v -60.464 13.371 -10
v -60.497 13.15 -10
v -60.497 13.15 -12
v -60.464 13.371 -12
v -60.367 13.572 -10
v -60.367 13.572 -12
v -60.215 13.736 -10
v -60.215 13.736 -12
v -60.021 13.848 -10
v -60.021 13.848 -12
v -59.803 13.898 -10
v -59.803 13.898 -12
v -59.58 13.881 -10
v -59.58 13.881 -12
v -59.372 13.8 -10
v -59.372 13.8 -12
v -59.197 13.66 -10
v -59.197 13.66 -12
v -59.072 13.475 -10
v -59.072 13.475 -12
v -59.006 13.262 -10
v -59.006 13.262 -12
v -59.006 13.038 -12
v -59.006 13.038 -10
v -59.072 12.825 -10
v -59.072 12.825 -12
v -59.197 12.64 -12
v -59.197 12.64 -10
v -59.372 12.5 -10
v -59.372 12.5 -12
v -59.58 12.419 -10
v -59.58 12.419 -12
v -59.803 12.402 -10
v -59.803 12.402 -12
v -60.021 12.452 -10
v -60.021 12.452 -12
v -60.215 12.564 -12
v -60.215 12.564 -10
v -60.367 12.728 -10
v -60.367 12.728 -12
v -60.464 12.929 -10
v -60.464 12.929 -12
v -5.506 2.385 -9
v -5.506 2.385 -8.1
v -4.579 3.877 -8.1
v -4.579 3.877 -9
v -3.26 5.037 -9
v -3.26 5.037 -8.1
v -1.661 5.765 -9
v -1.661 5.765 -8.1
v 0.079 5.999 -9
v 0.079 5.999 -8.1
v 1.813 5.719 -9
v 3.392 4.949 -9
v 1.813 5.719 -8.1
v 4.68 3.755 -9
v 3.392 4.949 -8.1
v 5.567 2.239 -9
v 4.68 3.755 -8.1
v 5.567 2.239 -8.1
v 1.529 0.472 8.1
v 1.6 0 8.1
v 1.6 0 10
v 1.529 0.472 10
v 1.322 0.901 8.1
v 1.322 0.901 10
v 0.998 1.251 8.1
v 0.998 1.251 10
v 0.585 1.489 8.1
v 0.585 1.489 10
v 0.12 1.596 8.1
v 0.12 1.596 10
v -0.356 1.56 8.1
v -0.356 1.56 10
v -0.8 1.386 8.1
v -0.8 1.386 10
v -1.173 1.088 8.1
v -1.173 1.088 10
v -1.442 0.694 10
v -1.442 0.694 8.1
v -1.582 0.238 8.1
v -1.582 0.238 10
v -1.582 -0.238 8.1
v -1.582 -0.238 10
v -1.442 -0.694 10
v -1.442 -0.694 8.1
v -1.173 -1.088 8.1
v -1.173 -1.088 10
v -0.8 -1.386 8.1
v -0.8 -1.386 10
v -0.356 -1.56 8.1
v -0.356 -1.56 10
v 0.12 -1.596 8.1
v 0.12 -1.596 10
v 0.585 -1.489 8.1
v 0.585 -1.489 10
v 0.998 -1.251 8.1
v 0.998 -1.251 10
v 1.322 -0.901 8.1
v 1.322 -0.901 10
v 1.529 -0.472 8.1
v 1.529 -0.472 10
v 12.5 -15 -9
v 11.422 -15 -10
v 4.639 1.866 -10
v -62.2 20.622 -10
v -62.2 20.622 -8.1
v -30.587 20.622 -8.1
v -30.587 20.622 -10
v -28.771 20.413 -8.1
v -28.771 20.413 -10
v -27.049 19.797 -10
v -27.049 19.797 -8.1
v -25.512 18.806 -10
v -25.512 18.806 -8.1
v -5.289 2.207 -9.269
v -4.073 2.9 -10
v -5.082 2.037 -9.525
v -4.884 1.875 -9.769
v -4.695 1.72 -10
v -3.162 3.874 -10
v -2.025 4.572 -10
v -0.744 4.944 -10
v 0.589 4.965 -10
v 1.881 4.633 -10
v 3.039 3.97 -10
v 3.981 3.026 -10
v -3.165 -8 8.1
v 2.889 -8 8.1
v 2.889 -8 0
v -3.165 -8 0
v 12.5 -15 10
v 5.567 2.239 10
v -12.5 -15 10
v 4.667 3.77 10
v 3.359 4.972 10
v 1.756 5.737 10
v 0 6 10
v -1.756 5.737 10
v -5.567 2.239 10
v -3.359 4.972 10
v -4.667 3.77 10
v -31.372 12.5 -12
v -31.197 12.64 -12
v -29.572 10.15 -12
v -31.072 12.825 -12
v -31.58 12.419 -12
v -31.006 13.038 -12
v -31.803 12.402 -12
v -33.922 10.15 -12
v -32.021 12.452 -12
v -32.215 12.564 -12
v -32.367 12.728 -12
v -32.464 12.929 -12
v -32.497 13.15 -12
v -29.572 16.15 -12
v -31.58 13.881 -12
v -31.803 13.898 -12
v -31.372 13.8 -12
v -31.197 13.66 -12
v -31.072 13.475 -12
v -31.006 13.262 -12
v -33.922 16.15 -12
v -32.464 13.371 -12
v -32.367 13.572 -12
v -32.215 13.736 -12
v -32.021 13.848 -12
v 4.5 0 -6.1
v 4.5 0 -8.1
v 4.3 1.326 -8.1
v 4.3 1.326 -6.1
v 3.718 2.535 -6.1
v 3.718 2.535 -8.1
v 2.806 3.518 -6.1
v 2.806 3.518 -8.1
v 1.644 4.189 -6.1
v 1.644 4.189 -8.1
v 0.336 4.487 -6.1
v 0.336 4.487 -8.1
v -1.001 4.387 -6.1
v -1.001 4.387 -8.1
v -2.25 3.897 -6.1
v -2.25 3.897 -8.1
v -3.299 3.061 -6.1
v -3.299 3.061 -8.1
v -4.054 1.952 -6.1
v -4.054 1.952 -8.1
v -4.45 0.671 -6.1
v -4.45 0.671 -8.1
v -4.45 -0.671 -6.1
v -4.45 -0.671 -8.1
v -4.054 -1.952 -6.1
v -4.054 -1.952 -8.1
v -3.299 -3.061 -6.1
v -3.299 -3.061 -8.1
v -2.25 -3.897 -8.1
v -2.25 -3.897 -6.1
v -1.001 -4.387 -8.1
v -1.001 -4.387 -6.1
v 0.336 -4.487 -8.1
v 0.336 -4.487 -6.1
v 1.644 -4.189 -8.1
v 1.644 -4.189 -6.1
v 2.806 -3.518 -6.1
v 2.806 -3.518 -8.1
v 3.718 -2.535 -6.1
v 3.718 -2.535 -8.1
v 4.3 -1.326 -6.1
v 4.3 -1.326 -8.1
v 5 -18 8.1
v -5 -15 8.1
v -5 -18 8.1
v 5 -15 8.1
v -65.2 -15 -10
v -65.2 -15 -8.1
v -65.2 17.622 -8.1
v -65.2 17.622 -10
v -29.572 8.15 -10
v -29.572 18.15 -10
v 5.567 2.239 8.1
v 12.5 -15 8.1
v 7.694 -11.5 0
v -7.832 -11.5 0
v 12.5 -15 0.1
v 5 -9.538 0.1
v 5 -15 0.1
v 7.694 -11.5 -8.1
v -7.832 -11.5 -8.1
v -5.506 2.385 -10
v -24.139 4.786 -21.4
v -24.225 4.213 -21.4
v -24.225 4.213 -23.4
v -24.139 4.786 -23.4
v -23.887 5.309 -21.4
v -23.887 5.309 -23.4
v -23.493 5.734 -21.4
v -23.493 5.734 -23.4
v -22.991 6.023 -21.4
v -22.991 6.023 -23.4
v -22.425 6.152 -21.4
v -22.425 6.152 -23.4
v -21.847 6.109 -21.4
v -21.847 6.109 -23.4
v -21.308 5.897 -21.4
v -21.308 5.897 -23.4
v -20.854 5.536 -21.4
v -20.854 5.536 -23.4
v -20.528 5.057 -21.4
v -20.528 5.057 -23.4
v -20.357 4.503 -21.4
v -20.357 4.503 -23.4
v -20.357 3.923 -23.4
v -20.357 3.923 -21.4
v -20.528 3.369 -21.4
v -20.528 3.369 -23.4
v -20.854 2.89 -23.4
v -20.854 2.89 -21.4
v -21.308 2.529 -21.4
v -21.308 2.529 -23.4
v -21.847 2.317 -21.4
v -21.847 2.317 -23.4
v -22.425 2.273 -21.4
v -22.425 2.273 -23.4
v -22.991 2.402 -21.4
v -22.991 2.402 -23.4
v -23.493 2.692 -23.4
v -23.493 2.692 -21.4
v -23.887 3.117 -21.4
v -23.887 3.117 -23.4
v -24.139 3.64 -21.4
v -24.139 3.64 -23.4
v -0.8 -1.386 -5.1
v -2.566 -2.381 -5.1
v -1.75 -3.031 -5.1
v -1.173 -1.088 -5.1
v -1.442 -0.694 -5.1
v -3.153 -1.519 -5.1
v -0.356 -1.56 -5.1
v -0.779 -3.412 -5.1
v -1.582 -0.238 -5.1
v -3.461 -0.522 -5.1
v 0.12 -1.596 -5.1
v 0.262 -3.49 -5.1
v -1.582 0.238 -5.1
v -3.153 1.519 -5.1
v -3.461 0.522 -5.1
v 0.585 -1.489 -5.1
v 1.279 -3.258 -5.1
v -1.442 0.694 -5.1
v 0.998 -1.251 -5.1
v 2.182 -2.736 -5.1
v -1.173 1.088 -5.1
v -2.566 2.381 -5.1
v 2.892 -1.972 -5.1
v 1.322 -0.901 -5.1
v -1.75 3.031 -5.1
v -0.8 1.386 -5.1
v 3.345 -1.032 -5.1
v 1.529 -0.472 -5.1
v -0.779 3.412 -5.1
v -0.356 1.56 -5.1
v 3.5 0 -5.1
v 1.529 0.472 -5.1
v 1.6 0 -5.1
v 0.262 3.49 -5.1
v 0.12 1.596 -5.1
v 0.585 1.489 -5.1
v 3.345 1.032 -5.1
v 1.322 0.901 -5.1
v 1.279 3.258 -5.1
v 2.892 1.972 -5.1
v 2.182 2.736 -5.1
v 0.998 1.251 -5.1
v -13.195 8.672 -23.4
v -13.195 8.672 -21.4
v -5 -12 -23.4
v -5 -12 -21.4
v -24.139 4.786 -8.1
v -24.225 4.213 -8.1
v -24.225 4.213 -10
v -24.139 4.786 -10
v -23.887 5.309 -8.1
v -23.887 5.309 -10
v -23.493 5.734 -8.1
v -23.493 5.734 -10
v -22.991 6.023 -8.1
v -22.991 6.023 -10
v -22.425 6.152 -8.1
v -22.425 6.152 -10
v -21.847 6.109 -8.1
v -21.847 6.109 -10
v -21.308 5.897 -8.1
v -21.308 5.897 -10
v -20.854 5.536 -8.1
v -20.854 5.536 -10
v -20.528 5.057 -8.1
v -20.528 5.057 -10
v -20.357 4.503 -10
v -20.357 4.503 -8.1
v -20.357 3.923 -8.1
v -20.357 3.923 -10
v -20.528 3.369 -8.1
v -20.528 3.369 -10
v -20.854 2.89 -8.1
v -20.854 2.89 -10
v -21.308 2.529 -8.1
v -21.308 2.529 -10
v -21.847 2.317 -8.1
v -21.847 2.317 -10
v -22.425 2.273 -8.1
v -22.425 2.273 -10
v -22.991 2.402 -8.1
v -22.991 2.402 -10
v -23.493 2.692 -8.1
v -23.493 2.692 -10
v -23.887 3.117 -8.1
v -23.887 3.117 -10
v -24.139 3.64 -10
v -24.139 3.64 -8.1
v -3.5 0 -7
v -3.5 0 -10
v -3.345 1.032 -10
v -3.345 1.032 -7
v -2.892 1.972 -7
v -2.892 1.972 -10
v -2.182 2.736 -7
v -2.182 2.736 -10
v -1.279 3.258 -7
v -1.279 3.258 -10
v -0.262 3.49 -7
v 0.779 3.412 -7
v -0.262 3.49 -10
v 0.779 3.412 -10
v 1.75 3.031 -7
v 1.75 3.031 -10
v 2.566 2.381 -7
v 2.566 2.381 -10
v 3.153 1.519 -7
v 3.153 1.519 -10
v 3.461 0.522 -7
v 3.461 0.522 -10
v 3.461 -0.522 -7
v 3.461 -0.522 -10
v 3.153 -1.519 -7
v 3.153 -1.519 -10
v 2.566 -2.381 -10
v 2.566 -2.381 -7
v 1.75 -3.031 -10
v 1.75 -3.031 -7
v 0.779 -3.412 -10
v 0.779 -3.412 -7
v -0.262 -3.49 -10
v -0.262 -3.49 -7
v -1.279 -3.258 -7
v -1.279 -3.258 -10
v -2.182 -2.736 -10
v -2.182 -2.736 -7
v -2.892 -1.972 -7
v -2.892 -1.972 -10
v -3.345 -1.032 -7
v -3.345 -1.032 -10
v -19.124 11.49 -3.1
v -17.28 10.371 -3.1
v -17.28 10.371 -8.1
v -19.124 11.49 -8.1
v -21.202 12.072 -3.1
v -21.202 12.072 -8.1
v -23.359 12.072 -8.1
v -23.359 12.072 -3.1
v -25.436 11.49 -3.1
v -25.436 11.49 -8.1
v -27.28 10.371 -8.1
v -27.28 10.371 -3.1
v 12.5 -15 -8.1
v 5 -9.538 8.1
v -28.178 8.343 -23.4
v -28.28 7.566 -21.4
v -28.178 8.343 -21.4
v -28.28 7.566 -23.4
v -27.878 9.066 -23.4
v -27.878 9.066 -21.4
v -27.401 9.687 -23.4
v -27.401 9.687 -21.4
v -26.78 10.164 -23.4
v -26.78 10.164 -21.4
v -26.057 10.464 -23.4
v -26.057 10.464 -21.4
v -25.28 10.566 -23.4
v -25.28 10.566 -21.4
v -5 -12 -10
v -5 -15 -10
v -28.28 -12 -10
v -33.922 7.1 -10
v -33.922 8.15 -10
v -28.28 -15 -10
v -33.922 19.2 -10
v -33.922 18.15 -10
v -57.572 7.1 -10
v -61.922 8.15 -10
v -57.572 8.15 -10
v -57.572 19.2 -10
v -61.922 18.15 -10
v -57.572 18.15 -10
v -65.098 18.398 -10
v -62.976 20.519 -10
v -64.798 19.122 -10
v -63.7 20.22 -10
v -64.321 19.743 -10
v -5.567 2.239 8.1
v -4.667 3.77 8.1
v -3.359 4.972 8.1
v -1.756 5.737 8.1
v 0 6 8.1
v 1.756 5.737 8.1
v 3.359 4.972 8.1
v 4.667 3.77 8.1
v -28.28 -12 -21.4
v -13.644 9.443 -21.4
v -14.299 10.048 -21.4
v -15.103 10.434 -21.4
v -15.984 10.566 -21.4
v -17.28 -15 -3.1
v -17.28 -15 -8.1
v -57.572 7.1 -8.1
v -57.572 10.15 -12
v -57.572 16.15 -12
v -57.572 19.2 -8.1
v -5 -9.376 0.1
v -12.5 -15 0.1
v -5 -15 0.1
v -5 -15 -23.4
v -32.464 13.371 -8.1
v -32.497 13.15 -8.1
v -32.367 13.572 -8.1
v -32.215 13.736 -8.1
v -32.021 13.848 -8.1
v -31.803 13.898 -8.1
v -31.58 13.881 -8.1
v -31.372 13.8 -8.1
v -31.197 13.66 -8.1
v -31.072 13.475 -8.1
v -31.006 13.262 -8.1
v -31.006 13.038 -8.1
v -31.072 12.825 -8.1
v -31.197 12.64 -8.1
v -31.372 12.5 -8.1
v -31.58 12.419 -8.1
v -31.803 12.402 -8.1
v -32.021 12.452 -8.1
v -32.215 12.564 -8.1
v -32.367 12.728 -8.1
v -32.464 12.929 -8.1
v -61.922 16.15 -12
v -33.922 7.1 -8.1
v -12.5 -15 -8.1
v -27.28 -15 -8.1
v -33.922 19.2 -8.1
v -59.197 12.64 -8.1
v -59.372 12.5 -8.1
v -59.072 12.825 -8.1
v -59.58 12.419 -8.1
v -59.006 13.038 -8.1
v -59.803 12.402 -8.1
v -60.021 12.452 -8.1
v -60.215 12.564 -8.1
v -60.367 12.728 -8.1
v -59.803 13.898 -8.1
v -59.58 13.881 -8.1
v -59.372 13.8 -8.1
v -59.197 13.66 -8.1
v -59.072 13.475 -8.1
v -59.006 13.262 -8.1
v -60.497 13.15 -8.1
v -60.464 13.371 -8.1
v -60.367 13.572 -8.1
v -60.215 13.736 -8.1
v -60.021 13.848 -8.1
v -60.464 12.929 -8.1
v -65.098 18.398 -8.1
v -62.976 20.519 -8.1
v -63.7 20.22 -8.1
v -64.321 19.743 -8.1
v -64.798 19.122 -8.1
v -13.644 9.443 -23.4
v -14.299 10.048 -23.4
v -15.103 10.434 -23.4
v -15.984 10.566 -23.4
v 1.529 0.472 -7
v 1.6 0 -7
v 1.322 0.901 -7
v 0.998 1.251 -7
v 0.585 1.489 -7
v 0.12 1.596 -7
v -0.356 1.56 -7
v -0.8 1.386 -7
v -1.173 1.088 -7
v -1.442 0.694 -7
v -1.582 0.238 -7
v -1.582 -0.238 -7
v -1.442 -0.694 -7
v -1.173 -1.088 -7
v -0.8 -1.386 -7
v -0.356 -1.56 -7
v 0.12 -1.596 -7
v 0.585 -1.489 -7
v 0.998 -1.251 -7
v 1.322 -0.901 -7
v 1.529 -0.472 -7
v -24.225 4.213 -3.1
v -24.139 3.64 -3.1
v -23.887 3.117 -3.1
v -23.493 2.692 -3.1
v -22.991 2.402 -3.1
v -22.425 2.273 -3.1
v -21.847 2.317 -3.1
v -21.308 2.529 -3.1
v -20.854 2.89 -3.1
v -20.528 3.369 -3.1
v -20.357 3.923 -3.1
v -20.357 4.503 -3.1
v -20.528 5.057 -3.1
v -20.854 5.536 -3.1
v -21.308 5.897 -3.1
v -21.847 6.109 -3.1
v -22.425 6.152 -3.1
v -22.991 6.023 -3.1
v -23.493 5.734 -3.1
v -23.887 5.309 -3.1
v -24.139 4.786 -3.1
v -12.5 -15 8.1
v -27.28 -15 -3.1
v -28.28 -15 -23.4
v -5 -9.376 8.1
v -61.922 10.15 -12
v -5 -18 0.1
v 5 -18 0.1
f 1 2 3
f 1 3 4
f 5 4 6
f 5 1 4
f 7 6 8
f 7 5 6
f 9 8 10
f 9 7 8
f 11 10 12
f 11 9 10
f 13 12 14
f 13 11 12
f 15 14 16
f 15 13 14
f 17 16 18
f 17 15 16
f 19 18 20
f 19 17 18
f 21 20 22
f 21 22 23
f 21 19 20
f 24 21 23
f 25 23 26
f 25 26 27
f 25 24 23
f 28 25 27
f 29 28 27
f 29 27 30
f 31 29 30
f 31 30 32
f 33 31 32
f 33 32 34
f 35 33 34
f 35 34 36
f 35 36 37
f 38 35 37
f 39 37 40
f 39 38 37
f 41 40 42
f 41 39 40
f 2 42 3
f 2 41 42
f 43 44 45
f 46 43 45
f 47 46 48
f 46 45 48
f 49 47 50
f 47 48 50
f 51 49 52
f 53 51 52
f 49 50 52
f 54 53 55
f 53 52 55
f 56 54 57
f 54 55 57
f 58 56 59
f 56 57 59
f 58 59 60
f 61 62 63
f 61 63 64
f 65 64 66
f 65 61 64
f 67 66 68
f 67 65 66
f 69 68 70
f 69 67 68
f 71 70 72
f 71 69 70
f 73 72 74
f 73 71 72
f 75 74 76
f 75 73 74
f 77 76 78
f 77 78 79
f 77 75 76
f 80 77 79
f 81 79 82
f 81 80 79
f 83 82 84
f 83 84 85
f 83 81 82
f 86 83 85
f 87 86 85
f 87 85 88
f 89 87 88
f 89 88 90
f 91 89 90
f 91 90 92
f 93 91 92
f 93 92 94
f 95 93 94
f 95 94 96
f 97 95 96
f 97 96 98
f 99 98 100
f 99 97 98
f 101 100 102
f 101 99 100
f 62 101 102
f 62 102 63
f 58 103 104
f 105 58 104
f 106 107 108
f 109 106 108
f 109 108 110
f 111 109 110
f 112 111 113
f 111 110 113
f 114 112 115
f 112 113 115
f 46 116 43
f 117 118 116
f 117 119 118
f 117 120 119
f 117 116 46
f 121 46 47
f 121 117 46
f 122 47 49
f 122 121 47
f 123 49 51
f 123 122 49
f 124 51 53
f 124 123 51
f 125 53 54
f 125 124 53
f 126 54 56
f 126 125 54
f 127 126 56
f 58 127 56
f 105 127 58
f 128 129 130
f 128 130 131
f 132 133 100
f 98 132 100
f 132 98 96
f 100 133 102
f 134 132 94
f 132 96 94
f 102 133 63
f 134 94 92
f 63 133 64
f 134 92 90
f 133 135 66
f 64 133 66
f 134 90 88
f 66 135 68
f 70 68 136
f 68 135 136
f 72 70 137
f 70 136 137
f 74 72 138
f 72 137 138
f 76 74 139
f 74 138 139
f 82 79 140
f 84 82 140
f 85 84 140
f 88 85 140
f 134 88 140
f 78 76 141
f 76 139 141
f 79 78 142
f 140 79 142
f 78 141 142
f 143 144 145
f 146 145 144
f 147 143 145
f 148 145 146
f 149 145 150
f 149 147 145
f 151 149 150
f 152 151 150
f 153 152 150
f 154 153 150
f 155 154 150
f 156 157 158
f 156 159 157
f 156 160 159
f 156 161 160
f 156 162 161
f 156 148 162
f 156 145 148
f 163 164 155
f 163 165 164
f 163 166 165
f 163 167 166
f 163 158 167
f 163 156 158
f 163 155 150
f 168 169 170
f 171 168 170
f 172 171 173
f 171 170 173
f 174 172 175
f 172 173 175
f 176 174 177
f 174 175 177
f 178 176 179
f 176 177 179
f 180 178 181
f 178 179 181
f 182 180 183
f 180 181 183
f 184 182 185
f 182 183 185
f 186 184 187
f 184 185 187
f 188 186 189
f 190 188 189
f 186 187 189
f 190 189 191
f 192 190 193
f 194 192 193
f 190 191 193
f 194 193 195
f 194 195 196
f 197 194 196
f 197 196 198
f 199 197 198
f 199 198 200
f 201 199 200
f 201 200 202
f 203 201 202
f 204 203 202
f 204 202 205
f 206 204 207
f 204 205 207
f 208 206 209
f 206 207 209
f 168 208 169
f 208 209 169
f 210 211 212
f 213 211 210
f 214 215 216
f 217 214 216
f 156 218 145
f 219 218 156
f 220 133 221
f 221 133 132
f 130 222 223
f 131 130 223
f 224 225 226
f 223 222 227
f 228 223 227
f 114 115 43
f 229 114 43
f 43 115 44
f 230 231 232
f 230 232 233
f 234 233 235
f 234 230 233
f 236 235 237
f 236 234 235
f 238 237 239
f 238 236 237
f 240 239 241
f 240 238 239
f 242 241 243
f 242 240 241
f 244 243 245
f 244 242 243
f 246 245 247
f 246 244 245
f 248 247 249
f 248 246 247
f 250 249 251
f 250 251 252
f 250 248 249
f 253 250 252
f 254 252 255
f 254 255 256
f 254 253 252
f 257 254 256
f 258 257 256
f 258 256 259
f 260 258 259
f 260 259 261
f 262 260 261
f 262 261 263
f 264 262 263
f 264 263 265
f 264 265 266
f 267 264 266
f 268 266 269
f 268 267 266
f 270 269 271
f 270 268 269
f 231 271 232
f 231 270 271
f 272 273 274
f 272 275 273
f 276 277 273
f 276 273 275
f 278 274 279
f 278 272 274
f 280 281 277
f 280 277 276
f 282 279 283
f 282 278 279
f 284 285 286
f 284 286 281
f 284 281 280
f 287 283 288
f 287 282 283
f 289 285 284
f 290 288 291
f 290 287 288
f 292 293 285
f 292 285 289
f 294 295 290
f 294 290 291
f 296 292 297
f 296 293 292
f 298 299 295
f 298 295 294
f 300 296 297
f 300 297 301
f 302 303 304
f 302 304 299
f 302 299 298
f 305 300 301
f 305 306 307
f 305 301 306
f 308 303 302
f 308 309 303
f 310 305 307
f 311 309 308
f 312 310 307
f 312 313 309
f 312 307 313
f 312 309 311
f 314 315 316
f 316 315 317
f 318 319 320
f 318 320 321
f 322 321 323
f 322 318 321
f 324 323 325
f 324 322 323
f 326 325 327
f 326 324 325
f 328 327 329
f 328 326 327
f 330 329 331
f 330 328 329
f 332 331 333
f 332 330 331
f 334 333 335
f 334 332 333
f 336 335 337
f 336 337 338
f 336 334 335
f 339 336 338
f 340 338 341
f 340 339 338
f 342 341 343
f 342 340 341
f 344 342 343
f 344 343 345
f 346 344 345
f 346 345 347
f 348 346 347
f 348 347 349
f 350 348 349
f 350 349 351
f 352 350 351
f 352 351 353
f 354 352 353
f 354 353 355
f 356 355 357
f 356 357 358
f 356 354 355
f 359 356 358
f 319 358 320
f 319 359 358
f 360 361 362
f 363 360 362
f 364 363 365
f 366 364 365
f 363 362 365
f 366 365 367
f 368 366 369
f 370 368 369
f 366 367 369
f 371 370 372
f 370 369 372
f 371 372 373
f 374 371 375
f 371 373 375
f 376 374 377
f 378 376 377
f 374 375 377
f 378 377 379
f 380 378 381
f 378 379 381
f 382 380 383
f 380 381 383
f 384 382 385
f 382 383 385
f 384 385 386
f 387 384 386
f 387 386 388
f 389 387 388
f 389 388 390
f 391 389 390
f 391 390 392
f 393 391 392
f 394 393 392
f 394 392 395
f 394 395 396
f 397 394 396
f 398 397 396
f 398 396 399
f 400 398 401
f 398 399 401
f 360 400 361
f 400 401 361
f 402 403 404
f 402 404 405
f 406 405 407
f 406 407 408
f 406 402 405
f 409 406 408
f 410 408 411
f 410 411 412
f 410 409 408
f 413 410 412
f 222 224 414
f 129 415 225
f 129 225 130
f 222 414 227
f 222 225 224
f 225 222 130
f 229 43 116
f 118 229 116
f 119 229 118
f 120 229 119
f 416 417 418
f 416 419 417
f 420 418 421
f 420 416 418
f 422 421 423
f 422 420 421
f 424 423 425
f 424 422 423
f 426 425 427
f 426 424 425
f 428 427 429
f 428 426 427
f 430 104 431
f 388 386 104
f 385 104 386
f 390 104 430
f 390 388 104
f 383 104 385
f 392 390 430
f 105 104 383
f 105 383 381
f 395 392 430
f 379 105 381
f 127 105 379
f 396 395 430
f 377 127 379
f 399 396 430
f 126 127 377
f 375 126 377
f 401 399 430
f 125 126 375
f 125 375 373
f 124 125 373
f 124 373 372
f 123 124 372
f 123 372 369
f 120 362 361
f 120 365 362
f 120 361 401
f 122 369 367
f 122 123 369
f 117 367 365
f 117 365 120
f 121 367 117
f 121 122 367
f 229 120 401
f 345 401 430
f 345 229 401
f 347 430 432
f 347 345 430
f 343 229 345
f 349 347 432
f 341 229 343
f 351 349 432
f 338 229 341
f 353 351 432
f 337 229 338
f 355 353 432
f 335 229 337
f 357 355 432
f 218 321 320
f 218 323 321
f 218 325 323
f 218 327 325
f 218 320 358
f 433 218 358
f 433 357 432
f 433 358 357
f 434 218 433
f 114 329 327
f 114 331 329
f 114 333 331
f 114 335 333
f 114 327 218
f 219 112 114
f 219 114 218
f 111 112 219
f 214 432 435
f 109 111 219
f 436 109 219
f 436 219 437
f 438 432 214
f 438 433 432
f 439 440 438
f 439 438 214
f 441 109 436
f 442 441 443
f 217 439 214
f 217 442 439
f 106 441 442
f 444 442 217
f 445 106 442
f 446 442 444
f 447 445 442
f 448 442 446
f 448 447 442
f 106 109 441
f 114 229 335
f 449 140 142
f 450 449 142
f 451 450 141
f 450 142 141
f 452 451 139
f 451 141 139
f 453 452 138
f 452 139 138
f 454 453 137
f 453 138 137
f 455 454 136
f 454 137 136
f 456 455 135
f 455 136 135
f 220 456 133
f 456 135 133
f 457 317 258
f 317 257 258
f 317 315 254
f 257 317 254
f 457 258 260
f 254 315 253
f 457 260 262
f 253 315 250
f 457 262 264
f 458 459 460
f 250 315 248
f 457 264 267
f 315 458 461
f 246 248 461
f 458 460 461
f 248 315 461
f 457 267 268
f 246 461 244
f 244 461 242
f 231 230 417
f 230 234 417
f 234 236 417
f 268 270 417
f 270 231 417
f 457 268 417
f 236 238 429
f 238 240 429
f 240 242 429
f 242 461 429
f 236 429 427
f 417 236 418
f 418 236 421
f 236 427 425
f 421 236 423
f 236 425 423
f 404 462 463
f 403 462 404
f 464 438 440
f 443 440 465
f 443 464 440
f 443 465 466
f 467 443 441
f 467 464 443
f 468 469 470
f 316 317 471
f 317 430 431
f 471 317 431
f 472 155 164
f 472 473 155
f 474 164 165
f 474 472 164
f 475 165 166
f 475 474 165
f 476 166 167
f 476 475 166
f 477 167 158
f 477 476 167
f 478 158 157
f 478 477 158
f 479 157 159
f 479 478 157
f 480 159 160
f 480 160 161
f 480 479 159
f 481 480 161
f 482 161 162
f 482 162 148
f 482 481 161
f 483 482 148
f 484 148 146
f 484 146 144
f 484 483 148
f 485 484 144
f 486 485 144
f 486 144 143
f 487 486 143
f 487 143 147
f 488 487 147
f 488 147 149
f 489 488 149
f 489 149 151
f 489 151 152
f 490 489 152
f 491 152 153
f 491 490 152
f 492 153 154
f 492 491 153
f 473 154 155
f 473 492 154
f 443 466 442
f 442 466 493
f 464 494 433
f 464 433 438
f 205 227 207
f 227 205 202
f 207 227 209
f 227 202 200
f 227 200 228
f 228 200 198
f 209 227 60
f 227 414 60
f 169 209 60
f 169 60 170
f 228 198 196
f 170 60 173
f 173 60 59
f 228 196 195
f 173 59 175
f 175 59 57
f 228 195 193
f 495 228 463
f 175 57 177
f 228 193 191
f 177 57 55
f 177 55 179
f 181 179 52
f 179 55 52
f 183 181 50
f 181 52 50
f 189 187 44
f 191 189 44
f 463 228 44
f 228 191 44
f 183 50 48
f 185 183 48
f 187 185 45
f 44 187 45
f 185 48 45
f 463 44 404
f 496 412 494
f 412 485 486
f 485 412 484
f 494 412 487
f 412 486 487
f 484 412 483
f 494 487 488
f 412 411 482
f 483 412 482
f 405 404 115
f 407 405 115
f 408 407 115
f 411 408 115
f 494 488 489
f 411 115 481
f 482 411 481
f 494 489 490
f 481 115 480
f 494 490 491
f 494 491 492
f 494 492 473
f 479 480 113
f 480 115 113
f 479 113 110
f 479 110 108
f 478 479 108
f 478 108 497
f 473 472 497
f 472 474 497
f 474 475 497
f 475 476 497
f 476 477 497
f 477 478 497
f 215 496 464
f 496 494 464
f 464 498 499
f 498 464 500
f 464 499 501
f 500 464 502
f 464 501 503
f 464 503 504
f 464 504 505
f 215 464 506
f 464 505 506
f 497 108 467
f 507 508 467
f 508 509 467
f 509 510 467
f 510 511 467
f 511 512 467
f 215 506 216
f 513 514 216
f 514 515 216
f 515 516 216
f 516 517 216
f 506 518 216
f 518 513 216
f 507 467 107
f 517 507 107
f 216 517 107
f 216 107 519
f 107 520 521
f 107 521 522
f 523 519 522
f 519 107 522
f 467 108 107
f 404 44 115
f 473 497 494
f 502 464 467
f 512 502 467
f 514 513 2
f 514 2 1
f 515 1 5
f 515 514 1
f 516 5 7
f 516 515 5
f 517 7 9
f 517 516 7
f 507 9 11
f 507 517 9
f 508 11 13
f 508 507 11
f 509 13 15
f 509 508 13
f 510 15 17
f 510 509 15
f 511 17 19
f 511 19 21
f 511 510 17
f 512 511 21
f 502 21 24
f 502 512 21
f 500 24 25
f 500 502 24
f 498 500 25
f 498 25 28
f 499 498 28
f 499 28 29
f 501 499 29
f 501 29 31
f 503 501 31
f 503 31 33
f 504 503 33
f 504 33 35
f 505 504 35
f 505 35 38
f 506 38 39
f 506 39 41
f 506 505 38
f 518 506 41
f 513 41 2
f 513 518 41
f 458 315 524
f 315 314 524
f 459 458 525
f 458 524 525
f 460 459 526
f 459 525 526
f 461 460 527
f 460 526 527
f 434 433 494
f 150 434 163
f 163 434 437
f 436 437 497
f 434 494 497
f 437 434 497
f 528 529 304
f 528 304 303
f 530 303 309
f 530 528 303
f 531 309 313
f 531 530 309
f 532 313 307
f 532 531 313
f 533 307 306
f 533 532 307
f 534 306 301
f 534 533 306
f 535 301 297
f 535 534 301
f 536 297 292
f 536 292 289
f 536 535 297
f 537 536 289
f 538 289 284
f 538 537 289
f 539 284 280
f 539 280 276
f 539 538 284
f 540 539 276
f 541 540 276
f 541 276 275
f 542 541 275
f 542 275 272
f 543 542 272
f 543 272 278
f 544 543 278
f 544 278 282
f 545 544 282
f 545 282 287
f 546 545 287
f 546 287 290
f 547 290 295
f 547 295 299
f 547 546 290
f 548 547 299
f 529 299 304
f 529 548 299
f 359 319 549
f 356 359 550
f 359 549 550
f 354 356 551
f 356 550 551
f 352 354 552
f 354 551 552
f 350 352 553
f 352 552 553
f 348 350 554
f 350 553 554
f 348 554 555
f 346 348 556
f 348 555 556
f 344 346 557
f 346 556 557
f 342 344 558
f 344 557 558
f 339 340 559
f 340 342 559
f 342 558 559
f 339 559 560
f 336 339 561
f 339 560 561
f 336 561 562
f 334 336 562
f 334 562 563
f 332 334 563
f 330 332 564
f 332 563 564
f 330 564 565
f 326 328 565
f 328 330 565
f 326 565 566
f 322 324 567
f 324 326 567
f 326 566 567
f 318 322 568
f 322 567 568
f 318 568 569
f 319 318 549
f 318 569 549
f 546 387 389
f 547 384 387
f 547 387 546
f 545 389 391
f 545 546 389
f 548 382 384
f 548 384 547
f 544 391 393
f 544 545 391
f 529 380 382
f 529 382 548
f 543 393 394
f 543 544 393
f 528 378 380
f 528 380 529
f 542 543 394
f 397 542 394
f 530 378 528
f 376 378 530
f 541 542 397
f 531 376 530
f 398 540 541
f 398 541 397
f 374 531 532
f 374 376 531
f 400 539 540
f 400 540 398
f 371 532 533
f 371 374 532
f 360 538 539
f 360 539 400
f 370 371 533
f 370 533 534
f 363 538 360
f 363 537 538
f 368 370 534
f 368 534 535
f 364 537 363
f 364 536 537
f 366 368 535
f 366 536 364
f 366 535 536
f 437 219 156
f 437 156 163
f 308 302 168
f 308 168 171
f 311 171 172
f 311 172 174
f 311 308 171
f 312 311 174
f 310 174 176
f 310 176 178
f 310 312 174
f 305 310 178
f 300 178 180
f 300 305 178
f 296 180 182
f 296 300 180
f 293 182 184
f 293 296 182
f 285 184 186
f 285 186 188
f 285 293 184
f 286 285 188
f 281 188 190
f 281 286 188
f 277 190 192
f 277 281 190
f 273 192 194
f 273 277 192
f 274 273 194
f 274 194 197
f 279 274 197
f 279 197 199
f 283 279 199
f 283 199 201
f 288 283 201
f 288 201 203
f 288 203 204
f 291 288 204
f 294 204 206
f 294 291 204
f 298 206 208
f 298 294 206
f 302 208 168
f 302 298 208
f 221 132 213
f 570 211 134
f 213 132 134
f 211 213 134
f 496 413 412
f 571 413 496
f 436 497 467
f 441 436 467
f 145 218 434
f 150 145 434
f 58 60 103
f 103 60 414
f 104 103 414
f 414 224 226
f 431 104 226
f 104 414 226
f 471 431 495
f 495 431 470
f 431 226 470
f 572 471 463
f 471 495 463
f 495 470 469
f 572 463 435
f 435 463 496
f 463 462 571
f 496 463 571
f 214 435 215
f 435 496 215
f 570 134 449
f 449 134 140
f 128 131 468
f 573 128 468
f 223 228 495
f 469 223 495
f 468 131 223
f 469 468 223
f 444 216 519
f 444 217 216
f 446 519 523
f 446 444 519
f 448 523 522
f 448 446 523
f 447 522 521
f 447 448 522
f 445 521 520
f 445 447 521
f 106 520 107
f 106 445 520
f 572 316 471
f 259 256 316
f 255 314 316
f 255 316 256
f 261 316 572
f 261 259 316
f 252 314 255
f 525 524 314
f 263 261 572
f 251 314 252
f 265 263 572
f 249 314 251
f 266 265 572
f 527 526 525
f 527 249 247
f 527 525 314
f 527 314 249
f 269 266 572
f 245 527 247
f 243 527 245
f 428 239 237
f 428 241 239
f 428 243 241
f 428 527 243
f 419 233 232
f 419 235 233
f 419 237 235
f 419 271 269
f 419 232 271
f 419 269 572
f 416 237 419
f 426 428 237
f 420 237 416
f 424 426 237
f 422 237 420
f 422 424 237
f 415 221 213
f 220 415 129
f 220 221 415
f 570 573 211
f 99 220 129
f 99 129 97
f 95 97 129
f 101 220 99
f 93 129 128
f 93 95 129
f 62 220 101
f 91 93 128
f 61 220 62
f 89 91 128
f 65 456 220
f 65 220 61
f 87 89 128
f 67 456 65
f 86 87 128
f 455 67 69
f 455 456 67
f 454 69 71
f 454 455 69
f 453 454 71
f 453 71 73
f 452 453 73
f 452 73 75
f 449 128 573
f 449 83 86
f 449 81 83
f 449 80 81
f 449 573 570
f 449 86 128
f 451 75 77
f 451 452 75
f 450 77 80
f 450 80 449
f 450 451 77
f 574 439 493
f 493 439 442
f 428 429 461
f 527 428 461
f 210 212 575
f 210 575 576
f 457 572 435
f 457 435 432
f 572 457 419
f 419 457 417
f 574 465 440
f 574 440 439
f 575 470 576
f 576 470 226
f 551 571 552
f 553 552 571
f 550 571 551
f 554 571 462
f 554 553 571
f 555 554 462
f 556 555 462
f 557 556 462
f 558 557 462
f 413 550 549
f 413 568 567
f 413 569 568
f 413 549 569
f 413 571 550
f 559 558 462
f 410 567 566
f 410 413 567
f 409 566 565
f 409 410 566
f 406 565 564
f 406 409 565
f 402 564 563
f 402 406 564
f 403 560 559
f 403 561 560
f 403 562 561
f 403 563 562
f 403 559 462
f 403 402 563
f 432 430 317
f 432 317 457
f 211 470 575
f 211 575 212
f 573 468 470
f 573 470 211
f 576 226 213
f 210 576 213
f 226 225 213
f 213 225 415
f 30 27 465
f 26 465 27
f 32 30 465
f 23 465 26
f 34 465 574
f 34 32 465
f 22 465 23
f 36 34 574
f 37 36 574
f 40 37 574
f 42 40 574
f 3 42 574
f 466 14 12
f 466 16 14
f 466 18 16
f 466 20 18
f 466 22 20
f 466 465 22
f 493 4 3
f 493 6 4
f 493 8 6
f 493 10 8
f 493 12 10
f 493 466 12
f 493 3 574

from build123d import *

# Parameters (mm, degrees)
CROQUIS1_R                 = 1.6
SALIENTE_EXTRUIR1_DEPTH    = 10
CORTAR_EXTRUIR1_DEPTH      = 8.1
CORTAR_EXTRUIR1_DEPTH_BACK = 8.1
CORTAR_EXTRUIR2_START      = 8.1
CROQUIS3_OUTSIDE_W         = 34.658
CROQUIS3_OUTSIDE_H         = 30.658
CROQUIS3_OUTSIDE_W_2       = 10
CROQUIS3_OUTSIDE_H_2       = 25.797501395
CORTAR_EXTRUIR2_DEPTH      = 8
CROQUIS4_W                 = 10
CROQUIS4_H                 = 8
SALIENTE_EXTRUIR3_DEPTH    = 3
CORTAR_EXTRUIR3_DEPTH      = 25.088378941
CORTAR_EXTRUIR3_DEPTH_BACK = 25.088378941
CROQUIS5_W                 = 8.1
CROQUIS5_H                 = 3.5
CROQUIS6_R                 = 4.5
CROQUIS6_R_2               = 1.6
SALIENTE_EXTRUIR4_DEPTH    = 3
CHAFL_N1_SIZE              = 1
CROQUIS7_R                 = 3.5
CORTAR_EXTRUIR4_DEPTH      = 3
SALIENTE_EXTRUIR8_START    = -1.9
CROQUIS8_R                 = 0.75
CROQUIS8_R_2               = 1.945
CROQUIS8_W                 = 23.65
CROQUIS8_H                 = 12.1
SALIENTE_EXTRUIR8_DEPTH    = 1.9
SALIENTE_EXTRUIR9_START    = 5
CROQUIS9_R                 = 1.945
SALIENTE_EXTRUIR9_DEPTH    = 5
CROQUIS10_W                = 23.280139212
CROQUIS10_H                = 3
SALIENTE_EXTRUIR10_DEPTH   = 11.4
CROQUIS11_R                = 1.945
SALIENTE_EXTRUIR11_DEPTH   = 2
REDONDEO1_R                = 3
CROQUIS12_W                = 4.35
CROQUIS12_H                = 6
CROQUIS12_R                = 0.75
SALIENTE_EXTRUIR12_DEPTH   = 2
CHAFL_N3_SIZE              = 2
CHAFL_N2_SIZE              = 1


# Some blends are built 0.0001 mm under size
with BuildPart() as part:
    # Croquis1 → Saliente-Extruir1 (new, symmetric)
    with BuildSketch(Plane.XY):
        with BuildLine():
            Line((-12.5, -15), (-5.566639674, 2.238866395))
            ThreePointArc((-5.566639674, 2.238866395), (0, 6), (5.566639674, 2.238866395))
            Line((5.566639674, 2.238866395), (12.5, -15))
            Line((12.5, -15), (-12.5, -15))
        make_face()
        Circle(CROQUIS1_R, mode=Mode.SUBTRACT)
    extrude(amount=SALIENTE_EXTRUIR1_DEPTH, both=True)

    # Croquis2 → Cortar-Extruir1 (cut, two sides: drawn at the far end of the back side and taken through both)
    with BuildSketch(Plane.XY.offset(-CORTAR_EXTRUIR1_DEPTH_BACK)):
        with BuildLine():
            Line((-12.5, -15), (-7.5, 0))
            ThreePointArc((-7.5, 0), (0, 7.5), (7.5, 0))
            Line((7.5, 0), (12.5, -15))
            Line((12.5, -15), (2.888582809, -8))
            Line((2.888582809, -8), (-3.164835235, -8))
            Line((-3.164835235, -8), (-12.5, -15))
        make_face()
    extrude(amount=CORTAR_EXTRUIR1_DEPTH + CORTAR_EXTRUIR1_DEPTH_BACK, mode=Mode.SUBTRACT)

    # Croquis3 outside → Cortar-Extruir2 (cut)
    with BuildSketch(Plane.XY.offset(CORTAR_EXTRUIR2_START)):
        with Locations((0, -4.5)):
            Rectangle(CROQUIS3_OUTSIDE_W, CROQUIS3_OUTSIDE_H)
        with Locations((0, -2.101249303)):
            Rectangle(CROQUIS3_OUTSIDE_W_2, CROQUIS3_OUTSIDE_H_2, mode=Mode.SUBTRACT)
    extrude(amount=-CORTAR_EXTRUIR2_DEPTH, mode=Mode.SUBTRACT)

    # Croquis4 → Saliente-Extruir3 (add)
    with BuildSketch(Plane.XZ.offset(15)):
        with Locations((0, 4.1)):
            Rectangle(CROQUIS4_W, CROQUIS4_H)
    extrude(amount=SALIENTE_EXTRUIR3_DEPTH)

    # Croquis5 → Cortar-Extruir3 (cut, two sides: drawn at the far end of the back side and taken through both)
    with BuildSketch(Plane(origin=(0, 0, 0), x_dir=(0, 0, -1), z_dir=(1, 0, 0)).offset(-CORTAR_EXTRUIR3_DEPTH_BACK)):
        with Locations((4.05, -9.75)):
            Rectangle(CROQUIS5_W, CROQUIS5_H)
    extrude(amount=CORTAR_EXTRUIR3_DEPTH + CORTAR_EXTRUIR3_DEPTH_BACK, mode=Mode.SUBTRACT)

    # Croquis6 → Saliente-Extruir4 (add)
    with BuildSketch(Plane.XY.offset(-8.1)):
        Circle(CROQUIS6_R)
        Circle(CROQUIS6_R_2, mode=Mode.SUBTRACT)
    extrude(amount=SALIENTE_EXTRUIR4_DEPTH)

    # Chaflán1
    chafl_n1_edges = [part.edges().sort_by_distance(p)[0] for p in [
        (-4.5, 0, -5.1),
    ]]
    chamfer(chafl_n1_edges, length=CHAFL_N1_SIZE)

    # Croquis7 → Cortar-Extruir4 (cut)
    with BuildSketch(Plane(origin=(0, 0, -10), x_dir=(-1, 0, 0), z_dir=(0, 0, -1))):
        Circle(CROQUIS7_R)
    extrude(amount=-CORTAR_EXTRUIR4_DEPTH, mode=Mode.SUBTRACT)

    # Croquis8 → Saliente-Extruir8 (add)
    with BuildSketch(Plane(origin=(0, 0, -10), x_dir=(-1, 0, 0), z_dir=(0, 0, -1)).offset(SALIENTE_EXTRUIR8_START)):
        with BuildLine():
            Line((65.2, -15), (65.2, 20.621697606))
            Line((65.2, 20.621697606), (30.587310575, 20.621717655))
            ThreePointArc((30.587310575, 20.621717655), (27.892014915, 20.154008561), (25.511873338, 18.805566286))
            Line((25.511873338, 18.805566286), (5.505516372, 2.38522315))
            ThreePointArc((5.505516372, 2.38522315), (5.536561655, 2.312246753), (5.566639674, 2.238866395))
            Line((5.566639674, 2.238866395), (12.5, -15))
            Line((12.5, -15), (65.2, -15))
        make_face()
        with Locations((59.747279072, 13.15)):
            Circle(CROQUIS8_R, mode=Mode.SUBTRACT)
        with Locations((31.747279072, 13.15)):
            Circle(CROQUIS8_R, mode=Mode.SUBTRACT)
        with Locations((22.280139212, 4.212923787)):
            Circle(CROQUIS8_R_2, mode=Mode.SUBTRACT)
        with Locations((45.747279072, 13.15)):
            Rectangle(CROQUIS8_W, CROQUIS8_H, mode=Mode.SUBTRACT)
    extrude(amount=SALIENTE_EXTRUIR8_DEPTH)

    # Croquis9 → Saliente-Extruir9 (add)
    with BuildSketch(Plane.XY.offset(-8.1).offset(SALIENTE_EXTRUIR9_START)):
        with BuildLine():
            Line((-27.280139212, -15), (-17.280139212, -15))
            Line((-17.280139212, -15), (-17.280139212, 10.371029295))
            ThreePointArc((-17.280139212, 10.371029295), (-22.280139212, 12.145279266), (-27.280139212, 10.371029295))
            Line((-27.280139212, 10.371029295), (-27.280139212, -15))
        make_face()
        with Locations(Location((-22.280139212, 4.212923787, 0), (0, 0, 180))):
            Circle(CROQUIS9_R, mode=Mode.SUBTRACT)
    extrude(amount=-SALIENTE_EXTRUIR9_DEPTH)

    # Croquis10 → Saliente-Extruir10 (add)
    with BuildSketch(Plane(origin=(0, 0, -10), x_dir=(-1, 0, 0), z_dir=(0, 0, -1))):
        with Locations((16.640069606, -13.5)):
            Rectangle(CROQUIS10_W, CROQUIS10_H)
    extrude(amount=SALIENTE_EXTRUIR10_DEPTH)

    # Croquis11 → Saliente-Extruir11 (add)
    with BuildSketch(Plane(origin=(0, 0, -21.4), x_dir=(-1, 0, 0), z_dir=(0, 0, -1))):
        Polygon((28.280139212, -15), (28.280139212, 10.566063957), (13.946510162, 10.566063957), (5, -12), (5, -15), align=None)
        with Locations((22.280139212, 4.212923787)):
            Circle(CROQUIS11_R, mode=Mode.SUBTRACT)
    extrude(amount=SALIENTE_EXTRUIR11_DEPTH)

    # Redondeo1
    redondeo1_edges = [part.edges().sort_by_distance(p)[0] for p in [
        (-65.2, 20.621697606, -9.05),
        (-28.280139212, 10.566063957, -22.4),
        (-13.946510162, 10.566063957, -22.4),
    ]]
    fillet(redondeo1_edges, radius=REDONDEO1_R)

    # Croquis12 → Saliente-Extruir12 (add)
    # profile 1 of 2: a face of its own
    with BuildSketch(Plane(origin=(0, 0, -10), x_dir=(-1, 0, 0), z_dir=(0, 0, -1))):
        with Locations((31.747279072, 13.15)):
            Rectangle(CROQUIS12_W, CROQUIS12_H)
        with Locations((31.747279072, 13.15)):
            Circle(CROQUIS12_R, mode=Mode.SUBTRACT)
    # profile 2 of 2: a face of its own
    with BuildSketch(Plane(origin=(0, 0, -10), x_dir=(-1, 0, 0), z_dir=(0, 0, -1))):
        with Locations((59.747279072, 13.15)):
            Rectangle(CROQUIS12_W, CROQUIS12_H)
        with Locations((59.747279072, 13.15)):
            Circle(CROQUIS12_R, mode=Mode.SUBTRACT)
    extrude(amount=SALIENTE_EXTRUIR12_DEPTH)

    # Chaflán3
    chafl_n3_edges = [part.edges().sort_by_distance(p)[0] for p in [
        (-31.747279072, 16.15, -10),
        (-31.747279072, 10.15, -10),
        (-59.747279072, 10.15, -10),
        (-59.747279072, 16.15, -10),
    ]]
    chamfer(chafl_n3_edges, length=CHAFL_N3_SIZE - 0.0001)  # a hair under: the kernel refuses the full size

    # Chaflán2
    # the kernel refuses this chamfer: 1 mm, written as the material it takes off along each edge
    with BuildSketch(Plane(origin=(0, 0, -10), x_dir=(-0.9997966291820871, -0.020166811253548467, 0), z_dir=(0.020166811253548467, -0.9997966291820871, 0))) as chafl_n2_piece_1_section:
        Polygon((6, -CHAFL_N2_SIZE), (6 - CHAFL_N2_SIZE, 0), (6, 0), align=None)
    chafl_n2_piece_1 = revolve(axis=Axis((0, 0, -10), (0, 0, -1)), revolution_arc=159.245879782, mode=Mode.PRIVATE)
    chafl_n2_piece_1 = split(chafl_n2_piece_1, bisect_by=Plane(origin=(-3.804583519, 0.989171828, -9.513770005), z_dir=(0.6344290754241263, 0.7729810788476574, 0)), keep=Keep.TOP, mode=Mode.PRIVATE)
    add(chafl_n2_piece_1, mode=Mode.SUBTRACT)
    with BuildSketch(Plane(origin=(5.566639674, 2.238866395, -10), x_dir=(0.02550993960358281, 0.01025993235875113, 0.9996219169112968), z_dir=(0.3731443992151493, -0.9277732790581789, 0))) as chafl_n2_piece_2:
        Polygon((CHAFL_N2_SIZE * 0.999621916911, CHAFL_N2_SIZE * 0.0274958766106), (-CHAFL_N2_SIZE * 0.0274958766106, CHAFL_N2_SIZE * 0.999621916911), (0, 0), align=None)
    extrude(amount=21.152587164, mode=Mode.SUBTRACT)


solid = part.part
